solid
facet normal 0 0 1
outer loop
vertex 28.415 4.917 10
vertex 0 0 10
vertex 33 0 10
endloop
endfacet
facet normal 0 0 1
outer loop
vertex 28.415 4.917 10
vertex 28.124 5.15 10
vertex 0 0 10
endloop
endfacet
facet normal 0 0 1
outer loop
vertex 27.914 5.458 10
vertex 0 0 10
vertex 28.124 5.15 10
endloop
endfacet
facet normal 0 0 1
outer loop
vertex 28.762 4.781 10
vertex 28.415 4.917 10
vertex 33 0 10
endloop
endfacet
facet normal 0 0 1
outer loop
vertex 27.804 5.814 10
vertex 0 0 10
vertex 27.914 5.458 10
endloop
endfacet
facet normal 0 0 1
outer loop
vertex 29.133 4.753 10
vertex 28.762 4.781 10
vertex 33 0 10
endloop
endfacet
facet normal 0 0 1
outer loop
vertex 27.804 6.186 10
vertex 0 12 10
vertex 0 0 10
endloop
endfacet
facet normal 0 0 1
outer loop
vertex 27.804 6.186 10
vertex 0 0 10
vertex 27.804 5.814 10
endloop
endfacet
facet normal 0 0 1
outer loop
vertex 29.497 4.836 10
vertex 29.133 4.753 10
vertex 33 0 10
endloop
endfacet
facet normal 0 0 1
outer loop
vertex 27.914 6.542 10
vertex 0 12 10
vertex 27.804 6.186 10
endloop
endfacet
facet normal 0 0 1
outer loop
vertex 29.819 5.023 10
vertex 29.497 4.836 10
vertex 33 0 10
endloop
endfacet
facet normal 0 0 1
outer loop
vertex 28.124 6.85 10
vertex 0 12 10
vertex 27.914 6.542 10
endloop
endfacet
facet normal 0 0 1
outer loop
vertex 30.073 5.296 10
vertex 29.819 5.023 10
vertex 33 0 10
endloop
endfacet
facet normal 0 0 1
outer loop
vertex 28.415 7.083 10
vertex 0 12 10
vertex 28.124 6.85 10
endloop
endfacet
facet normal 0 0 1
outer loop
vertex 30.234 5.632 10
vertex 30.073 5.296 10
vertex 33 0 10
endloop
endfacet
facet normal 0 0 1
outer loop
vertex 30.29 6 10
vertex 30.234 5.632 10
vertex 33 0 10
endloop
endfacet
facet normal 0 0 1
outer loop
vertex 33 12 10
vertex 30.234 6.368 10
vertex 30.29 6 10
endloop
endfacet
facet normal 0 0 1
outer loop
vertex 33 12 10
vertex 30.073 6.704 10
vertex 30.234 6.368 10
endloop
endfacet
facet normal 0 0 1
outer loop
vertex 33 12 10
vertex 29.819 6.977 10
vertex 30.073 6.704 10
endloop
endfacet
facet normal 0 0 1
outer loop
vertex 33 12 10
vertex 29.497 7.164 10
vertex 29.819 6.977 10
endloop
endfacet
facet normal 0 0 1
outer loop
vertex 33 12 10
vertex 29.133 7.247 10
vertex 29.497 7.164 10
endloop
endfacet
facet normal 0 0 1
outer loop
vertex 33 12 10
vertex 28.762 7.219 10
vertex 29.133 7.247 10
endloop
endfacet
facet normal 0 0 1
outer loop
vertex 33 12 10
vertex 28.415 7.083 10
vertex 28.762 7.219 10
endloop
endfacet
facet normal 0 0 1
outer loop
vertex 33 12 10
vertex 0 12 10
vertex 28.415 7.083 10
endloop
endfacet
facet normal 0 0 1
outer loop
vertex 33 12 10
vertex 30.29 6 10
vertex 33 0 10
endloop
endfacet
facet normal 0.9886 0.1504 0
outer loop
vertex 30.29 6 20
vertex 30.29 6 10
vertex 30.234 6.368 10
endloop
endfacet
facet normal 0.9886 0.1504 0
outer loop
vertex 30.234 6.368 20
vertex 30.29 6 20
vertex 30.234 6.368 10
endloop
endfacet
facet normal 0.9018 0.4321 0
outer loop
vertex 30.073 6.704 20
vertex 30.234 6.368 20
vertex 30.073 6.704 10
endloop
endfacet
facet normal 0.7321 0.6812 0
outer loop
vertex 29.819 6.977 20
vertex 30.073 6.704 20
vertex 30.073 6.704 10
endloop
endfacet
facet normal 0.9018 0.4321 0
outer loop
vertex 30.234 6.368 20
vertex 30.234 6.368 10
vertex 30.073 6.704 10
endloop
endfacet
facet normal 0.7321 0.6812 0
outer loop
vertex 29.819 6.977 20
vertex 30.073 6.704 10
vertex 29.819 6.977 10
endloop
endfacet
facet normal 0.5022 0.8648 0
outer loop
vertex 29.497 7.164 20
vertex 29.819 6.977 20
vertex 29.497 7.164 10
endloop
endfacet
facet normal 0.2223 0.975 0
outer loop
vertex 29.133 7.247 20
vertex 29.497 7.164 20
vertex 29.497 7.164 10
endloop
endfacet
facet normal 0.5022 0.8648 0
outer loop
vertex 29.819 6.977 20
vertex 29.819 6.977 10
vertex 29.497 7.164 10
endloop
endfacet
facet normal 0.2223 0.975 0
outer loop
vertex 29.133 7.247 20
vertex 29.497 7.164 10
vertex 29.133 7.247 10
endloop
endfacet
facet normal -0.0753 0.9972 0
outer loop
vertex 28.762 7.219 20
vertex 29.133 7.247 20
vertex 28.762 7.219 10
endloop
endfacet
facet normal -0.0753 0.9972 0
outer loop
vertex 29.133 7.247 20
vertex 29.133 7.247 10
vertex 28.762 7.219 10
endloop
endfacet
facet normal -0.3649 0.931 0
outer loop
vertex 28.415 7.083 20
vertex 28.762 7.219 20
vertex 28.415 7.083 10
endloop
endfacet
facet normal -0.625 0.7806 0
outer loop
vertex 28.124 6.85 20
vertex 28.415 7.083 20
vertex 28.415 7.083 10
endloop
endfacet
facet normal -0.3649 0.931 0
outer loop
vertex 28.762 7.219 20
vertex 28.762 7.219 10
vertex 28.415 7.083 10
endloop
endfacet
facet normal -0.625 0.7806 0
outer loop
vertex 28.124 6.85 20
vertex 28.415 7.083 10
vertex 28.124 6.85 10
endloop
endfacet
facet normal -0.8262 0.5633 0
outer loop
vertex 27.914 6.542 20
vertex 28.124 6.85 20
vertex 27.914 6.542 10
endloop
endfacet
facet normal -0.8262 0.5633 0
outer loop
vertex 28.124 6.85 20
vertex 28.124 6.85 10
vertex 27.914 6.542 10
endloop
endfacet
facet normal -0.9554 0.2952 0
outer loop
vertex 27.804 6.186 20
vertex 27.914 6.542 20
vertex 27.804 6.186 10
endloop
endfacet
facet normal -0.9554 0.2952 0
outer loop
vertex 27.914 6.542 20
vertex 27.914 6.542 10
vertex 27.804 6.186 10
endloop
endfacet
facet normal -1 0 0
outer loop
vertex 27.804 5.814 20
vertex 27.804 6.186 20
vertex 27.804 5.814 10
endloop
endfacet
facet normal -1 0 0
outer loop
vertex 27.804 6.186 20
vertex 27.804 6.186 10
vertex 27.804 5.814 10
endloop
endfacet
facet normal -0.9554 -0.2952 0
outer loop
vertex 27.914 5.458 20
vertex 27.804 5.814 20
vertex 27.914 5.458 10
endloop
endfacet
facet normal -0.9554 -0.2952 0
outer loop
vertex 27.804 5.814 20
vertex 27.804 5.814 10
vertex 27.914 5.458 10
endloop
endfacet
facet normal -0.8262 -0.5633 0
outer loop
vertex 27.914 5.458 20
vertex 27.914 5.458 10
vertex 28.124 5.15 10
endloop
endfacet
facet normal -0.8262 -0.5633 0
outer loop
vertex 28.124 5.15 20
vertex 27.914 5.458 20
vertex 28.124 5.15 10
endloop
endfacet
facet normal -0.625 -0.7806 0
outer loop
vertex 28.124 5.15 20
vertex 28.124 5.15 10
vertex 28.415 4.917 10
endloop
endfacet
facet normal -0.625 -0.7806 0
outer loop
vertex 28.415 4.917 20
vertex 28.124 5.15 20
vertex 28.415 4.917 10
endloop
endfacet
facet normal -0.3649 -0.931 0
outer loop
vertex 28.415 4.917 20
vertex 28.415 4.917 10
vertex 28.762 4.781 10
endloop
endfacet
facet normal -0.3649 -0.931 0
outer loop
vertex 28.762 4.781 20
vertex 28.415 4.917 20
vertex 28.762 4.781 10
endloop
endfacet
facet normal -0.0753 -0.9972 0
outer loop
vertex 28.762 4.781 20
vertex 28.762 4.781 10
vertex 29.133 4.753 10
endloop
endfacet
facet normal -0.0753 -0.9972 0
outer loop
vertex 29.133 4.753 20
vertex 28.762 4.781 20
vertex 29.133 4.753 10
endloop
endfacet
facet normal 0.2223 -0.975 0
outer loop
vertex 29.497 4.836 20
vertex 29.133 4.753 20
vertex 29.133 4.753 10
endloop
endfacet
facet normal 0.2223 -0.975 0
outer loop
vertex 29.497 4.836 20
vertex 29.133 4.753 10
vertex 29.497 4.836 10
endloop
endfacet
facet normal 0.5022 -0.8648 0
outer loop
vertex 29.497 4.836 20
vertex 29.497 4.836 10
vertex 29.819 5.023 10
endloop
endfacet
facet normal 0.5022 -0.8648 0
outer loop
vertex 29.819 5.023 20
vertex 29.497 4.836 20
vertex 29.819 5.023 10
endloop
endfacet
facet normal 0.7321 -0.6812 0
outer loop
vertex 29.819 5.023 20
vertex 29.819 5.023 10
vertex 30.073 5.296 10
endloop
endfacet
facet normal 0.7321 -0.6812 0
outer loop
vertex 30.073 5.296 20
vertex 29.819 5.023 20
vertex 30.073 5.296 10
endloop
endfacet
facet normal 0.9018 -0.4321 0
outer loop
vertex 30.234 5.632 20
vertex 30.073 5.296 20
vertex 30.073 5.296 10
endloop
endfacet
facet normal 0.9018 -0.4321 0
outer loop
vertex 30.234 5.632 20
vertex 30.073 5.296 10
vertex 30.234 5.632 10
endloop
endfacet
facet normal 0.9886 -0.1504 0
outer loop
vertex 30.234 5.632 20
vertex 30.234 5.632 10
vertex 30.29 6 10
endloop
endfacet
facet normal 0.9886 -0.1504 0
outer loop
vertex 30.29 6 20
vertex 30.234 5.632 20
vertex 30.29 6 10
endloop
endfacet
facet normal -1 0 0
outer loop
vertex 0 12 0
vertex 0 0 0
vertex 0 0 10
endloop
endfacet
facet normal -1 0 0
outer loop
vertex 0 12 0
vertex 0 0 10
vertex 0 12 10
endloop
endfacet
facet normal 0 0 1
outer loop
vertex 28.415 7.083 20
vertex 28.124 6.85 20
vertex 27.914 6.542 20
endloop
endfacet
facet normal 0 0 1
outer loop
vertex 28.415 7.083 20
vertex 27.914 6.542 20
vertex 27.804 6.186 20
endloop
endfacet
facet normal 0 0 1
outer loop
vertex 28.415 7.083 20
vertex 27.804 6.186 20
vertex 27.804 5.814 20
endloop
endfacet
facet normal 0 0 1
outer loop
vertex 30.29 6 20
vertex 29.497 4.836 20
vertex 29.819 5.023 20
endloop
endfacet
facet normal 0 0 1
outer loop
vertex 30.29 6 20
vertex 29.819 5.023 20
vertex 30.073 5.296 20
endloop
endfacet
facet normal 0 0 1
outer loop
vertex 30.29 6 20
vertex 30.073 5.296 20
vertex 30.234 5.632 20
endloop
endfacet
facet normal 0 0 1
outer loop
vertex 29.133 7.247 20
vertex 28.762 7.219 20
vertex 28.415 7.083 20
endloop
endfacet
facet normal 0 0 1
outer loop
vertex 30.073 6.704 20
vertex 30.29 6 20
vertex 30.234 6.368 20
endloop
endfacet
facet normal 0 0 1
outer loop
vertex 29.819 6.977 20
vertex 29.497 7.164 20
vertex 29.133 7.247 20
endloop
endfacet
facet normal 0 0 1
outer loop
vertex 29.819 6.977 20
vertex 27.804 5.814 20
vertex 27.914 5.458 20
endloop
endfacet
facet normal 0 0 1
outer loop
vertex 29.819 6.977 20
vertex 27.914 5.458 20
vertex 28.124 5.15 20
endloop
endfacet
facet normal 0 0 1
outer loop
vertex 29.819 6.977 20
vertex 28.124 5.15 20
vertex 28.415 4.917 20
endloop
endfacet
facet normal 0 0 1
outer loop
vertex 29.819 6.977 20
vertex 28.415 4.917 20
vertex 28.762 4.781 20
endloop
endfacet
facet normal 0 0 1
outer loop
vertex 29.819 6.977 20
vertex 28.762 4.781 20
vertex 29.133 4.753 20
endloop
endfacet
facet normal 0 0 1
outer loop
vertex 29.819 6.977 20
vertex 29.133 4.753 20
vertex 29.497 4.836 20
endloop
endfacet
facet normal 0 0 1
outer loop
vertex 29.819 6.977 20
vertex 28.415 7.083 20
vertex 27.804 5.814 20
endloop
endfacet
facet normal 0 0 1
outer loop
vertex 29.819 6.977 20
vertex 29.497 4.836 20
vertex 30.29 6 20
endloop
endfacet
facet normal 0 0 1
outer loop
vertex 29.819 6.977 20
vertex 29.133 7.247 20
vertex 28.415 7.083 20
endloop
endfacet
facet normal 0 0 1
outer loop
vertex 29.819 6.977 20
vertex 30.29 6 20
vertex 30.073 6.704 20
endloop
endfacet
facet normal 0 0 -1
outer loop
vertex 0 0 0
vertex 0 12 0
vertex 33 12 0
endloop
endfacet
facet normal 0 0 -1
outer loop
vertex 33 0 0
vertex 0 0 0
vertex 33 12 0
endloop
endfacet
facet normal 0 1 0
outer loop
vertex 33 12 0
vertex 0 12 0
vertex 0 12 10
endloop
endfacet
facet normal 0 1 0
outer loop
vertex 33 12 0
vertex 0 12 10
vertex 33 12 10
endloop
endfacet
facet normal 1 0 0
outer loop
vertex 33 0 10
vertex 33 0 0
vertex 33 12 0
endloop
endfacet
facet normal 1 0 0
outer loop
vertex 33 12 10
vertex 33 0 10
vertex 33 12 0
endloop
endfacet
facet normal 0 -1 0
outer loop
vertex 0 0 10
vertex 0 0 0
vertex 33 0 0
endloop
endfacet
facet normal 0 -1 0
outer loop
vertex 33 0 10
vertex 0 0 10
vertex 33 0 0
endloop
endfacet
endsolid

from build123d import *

# Parameters (mm, degrees)
SKETCH1_R           = 1.25
BOSS_EXTRUDE2_DEPTH = 20
SKETCH1_5_W         = 33
SKETCH1_5_H         = 12
SKETCH1_5_R         = 1.25
BOSS_EXTRUDE3_DEPTH = 10


with BuildPart() as part:
    # Sketch1 → Boss-Extrude2 (new body)
    with BuildSketch(Plane.XY):
        with Locations((29.04, 6)):
            Circle(SKETCH1_R)
    extrude(amount=BOSS_EXTRUDE2_DEPTH)

    # Sketch1<5> → Boss-Extrude3 (add)
    with BuildSketch(Plane.XY):
        with Locations((16.5, 6)):
            Rectangle(SKETCH1_5_W, SKETCH1_5_H)
        with Locations((29.04, 6)):
            Circle(SKETCH1_5_R, mode=Mode.SUBTRACT)
    extrude(amount=BOSS_EXTRUDE3_DEPTH)


solid = part.part
